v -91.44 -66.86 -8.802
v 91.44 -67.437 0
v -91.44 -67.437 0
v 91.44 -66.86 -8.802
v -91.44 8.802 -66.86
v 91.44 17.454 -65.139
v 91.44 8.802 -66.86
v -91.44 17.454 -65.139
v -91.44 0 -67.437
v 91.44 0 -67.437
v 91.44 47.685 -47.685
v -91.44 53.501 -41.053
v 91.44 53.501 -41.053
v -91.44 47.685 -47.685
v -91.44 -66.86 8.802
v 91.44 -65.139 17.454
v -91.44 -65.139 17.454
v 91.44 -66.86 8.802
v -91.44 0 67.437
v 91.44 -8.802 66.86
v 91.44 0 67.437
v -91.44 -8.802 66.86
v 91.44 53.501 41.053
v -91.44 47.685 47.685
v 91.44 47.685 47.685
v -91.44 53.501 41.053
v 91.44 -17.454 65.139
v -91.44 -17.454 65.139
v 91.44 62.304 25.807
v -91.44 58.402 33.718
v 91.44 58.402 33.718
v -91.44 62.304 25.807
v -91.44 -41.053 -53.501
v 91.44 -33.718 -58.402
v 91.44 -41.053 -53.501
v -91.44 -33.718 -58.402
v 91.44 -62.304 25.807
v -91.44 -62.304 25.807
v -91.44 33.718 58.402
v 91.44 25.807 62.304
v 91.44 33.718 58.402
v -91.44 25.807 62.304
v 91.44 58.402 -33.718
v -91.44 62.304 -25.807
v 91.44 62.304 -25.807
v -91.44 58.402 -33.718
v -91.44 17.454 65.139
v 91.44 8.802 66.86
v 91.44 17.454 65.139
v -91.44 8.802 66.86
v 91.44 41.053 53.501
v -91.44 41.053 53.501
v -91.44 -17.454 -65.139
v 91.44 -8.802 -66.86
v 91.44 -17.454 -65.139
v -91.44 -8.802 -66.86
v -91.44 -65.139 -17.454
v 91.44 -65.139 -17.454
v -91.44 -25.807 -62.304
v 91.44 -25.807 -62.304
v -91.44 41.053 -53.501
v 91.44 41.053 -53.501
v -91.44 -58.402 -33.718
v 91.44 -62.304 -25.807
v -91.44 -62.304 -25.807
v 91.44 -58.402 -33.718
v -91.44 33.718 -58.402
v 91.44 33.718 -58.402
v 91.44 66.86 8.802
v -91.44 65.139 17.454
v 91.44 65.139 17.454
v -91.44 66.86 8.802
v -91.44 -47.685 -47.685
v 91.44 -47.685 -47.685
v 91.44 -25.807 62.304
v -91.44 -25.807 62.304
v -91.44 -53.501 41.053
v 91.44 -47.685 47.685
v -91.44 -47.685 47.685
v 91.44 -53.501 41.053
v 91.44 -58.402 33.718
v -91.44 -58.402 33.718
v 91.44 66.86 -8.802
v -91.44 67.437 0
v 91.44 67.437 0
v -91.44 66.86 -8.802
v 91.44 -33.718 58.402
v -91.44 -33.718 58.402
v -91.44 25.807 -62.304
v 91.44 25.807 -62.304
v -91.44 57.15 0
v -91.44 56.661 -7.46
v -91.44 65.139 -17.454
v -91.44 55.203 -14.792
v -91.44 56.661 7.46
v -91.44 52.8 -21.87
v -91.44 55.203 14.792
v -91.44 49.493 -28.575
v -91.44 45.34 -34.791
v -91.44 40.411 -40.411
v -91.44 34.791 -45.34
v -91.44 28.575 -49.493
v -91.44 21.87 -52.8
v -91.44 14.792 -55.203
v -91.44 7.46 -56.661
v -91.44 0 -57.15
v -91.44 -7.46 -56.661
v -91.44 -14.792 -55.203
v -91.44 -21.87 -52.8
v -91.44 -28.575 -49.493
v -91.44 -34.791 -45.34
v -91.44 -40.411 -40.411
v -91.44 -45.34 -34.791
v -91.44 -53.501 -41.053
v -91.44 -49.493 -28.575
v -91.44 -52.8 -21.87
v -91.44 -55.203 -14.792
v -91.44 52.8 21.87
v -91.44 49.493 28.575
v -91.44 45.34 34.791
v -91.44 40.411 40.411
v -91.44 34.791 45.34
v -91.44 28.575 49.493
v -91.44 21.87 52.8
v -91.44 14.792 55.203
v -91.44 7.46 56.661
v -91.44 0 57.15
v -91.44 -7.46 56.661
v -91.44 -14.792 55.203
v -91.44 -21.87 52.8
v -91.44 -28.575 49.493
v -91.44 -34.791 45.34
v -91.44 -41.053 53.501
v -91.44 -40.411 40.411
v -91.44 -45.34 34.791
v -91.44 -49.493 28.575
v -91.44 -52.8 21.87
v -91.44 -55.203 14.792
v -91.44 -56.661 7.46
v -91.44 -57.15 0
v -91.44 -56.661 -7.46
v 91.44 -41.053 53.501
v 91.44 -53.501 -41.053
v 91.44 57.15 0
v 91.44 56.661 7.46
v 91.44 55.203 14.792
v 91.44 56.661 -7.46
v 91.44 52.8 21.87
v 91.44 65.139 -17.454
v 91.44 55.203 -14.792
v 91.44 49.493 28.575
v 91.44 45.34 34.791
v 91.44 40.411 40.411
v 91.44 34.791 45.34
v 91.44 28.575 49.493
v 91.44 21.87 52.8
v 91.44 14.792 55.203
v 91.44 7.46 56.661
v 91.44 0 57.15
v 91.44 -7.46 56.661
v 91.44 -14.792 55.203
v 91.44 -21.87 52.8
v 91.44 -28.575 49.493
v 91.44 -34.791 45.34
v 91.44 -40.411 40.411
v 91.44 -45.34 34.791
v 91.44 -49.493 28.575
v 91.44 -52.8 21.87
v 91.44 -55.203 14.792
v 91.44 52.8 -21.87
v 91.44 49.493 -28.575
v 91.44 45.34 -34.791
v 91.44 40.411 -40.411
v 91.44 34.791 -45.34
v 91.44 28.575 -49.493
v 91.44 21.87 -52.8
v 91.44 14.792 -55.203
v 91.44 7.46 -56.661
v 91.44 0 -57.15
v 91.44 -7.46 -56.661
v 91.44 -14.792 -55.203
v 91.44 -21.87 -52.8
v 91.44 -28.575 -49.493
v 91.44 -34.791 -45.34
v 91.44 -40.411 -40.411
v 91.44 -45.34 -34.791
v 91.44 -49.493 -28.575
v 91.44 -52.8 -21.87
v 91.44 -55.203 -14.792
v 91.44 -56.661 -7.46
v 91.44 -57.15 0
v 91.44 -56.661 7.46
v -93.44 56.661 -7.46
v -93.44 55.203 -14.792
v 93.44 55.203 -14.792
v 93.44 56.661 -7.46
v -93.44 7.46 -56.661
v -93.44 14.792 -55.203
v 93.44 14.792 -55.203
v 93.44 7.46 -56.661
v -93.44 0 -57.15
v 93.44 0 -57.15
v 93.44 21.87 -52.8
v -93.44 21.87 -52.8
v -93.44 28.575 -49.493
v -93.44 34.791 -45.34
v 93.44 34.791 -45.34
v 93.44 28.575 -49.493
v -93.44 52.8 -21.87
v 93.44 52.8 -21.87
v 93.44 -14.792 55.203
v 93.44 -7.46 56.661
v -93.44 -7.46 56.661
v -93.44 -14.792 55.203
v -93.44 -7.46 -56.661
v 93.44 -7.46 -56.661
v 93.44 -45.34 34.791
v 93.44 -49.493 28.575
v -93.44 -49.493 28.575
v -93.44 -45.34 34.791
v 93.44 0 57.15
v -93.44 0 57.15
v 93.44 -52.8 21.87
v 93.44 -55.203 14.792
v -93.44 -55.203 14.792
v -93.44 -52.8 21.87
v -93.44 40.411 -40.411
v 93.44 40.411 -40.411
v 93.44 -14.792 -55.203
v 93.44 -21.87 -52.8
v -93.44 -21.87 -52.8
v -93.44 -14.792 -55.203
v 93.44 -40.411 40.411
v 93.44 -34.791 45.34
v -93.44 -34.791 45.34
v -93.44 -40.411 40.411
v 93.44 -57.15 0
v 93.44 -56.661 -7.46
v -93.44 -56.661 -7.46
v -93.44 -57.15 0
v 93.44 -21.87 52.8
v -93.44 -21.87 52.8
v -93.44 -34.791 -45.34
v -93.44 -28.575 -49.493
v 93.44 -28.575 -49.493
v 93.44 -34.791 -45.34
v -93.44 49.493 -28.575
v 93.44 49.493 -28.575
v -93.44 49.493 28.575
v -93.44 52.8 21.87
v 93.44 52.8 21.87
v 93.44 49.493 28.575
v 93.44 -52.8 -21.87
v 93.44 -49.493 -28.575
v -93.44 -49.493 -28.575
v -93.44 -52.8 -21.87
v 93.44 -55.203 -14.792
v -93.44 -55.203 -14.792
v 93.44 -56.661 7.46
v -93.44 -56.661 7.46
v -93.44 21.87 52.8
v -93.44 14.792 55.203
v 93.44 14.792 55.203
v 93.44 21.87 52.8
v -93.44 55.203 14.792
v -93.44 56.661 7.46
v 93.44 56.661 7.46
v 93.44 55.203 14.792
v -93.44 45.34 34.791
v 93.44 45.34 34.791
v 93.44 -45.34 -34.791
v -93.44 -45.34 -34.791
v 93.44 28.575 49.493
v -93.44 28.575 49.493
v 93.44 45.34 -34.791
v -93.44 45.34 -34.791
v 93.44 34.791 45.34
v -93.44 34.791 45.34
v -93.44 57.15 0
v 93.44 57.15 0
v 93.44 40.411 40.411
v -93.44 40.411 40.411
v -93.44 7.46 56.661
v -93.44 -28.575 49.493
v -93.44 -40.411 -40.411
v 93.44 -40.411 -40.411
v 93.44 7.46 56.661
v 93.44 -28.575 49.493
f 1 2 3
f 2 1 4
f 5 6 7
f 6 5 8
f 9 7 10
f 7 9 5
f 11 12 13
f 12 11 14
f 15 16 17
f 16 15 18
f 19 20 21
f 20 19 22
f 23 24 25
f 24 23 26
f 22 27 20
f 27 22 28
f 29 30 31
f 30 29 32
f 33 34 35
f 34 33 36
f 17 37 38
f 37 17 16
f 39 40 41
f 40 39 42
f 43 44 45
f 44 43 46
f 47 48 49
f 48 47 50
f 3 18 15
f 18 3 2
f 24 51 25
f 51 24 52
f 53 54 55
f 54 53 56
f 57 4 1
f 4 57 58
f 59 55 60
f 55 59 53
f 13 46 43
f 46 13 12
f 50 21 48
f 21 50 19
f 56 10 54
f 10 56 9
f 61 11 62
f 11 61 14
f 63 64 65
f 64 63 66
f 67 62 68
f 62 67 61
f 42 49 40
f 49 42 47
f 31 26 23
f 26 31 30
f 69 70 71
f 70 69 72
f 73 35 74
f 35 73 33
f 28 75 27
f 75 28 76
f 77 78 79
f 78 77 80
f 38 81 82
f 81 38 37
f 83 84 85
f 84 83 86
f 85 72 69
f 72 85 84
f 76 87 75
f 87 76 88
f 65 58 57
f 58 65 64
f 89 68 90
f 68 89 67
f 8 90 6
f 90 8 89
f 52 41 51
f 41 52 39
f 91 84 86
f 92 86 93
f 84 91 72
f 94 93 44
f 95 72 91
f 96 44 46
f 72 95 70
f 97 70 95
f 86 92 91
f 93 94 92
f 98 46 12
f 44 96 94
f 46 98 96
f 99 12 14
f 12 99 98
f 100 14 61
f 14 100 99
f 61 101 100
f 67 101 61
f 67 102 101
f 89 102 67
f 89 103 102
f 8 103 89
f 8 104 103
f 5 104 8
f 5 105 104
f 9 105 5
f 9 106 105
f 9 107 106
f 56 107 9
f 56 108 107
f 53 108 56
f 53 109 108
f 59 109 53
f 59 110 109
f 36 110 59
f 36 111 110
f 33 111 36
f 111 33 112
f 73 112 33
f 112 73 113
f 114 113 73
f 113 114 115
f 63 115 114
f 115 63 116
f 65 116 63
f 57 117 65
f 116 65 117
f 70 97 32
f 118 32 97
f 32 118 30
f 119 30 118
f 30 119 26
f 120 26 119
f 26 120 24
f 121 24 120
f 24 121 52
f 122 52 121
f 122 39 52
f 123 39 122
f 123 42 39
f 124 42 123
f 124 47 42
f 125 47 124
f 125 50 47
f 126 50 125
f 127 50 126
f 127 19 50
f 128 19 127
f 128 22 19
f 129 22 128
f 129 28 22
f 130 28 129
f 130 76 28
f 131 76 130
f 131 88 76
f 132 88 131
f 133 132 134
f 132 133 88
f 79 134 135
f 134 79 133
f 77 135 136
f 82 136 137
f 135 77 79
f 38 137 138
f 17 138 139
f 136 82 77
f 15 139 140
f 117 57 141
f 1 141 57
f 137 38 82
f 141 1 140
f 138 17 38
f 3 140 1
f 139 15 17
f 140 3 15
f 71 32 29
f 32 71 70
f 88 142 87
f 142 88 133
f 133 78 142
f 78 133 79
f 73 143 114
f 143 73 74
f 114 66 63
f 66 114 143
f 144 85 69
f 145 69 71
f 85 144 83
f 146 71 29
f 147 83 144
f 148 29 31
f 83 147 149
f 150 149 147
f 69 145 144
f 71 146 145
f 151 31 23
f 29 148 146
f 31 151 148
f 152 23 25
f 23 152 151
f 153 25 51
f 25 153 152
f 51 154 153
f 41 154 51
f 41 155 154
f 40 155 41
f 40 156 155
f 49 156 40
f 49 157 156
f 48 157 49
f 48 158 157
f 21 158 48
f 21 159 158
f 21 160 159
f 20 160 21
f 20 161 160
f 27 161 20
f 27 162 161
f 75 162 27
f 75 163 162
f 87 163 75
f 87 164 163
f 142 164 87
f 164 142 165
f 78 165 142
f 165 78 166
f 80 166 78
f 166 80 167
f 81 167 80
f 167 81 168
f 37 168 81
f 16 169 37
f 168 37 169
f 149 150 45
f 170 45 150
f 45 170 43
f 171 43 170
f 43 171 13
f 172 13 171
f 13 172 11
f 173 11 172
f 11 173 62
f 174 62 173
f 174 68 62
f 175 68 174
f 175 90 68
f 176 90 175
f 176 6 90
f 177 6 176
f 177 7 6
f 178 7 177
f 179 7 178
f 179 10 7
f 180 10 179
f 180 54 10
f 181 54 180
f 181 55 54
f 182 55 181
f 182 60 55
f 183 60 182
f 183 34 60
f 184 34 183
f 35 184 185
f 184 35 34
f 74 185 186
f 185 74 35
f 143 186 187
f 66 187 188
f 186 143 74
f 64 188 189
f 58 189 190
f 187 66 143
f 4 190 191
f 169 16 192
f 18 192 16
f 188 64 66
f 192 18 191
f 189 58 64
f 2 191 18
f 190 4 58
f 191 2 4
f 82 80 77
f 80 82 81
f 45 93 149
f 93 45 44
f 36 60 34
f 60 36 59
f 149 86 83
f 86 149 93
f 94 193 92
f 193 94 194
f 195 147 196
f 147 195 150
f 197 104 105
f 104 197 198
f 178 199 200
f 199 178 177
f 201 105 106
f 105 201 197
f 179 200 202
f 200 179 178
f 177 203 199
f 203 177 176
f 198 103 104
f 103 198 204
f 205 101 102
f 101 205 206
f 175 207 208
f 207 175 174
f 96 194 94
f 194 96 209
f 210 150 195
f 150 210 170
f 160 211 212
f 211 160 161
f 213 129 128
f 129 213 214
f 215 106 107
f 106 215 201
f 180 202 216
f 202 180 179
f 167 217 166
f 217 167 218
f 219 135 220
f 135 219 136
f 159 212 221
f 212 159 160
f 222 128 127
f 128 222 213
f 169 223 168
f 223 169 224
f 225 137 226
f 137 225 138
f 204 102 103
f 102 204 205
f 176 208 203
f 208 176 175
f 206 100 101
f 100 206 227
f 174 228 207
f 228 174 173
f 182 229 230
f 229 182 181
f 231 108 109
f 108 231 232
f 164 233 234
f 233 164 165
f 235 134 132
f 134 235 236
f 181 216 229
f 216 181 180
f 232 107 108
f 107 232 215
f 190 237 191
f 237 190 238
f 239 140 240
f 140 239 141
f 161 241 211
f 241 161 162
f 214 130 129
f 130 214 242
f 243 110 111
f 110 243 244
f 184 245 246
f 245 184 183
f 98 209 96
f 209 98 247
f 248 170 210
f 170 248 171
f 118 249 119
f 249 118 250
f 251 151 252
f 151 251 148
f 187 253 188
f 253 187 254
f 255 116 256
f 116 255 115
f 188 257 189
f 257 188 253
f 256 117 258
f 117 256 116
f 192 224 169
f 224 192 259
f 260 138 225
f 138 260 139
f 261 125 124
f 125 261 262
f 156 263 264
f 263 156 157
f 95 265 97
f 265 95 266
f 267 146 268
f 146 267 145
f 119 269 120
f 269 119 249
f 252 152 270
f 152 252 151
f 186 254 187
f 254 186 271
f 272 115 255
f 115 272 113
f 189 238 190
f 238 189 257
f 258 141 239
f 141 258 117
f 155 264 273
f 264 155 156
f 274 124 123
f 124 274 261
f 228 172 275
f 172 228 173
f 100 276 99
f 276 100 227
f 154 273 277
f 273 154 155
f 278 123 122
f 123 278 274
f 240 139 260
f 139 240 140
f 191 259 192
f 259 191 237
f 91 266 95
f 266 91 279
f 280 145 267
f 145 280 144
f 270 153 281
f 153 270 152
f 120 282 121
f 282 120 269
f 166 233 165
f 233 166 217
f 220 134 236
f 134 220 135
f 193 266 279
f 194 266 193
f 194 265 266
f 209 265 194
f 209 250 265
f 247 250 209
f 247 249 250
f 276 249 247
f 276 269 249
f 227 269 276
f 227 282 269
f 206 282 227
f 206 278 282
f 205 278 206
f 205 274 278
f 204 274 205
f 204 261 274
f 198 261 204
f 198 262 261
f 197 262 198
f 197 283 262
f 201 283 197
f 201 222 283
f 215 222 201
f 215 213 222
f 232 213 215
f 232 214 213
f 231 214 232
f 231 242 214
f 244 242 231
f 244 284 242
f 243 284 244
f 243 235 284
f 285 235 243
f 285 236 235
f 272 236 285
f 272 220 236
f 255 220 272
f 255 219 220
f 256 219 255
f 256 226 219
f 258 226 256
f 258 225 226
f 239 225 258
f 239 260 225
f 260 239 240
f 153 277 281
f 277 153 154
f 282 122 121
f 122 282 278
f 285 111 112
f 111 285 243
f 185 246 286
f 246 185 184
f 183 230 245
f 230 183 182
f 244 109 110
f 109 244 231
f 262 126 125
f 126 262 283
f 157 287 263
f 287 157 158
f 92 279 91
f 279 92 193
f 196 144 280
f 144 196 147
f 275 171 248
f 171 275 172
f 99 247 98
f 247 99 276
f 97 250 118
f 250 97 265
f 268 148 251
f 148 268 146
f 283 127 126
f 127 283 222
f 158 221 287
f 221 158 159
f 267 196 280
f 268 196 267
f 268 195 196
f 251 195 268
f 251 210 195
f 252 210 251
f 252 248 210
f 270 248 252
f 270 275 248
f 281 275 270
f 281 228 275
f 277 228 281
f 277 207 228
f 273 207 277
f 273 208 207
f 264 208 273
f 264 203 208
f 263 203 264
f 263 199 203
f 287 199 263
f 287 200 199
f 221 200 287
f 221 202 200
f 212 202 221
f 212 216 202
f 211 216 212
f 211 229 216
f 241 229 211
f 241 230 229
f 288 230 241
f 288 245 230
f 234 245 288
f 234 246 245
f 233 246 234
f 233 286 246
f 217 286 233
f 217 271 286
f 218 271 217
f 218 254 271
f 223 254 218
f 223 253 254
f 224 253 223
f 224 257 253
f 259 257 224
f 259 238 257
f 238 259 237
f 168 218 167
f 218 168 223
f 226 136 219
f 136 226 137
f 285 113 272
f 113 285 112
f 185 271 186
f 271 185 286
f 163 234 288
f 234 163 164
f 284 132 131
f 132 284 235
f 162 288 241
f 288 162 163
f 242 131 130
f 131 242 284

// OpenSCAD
// Auto-generated by scripts/author_from_manifest.py (Phase D.3).
// Source: data/phase_d_manifest.json (sku_intent='victaulic-107v-quickvic-coupling-4in').
// Do not hand-edit — regenerate from the manifest.
//
// @part victaulic_107v_quickvic_coupling_4in
// @kind fitting
// @category fitting.coupling
// @display-name "Victaulic QuickVic Style 107V Installation-Ready Coupling 4\""
// @mfg victaulic
// @mfg-pn Style_107V_4in
// @listing UL FM
// @price-usd 62.00
// @install-minutes 6
// @crew journeyman
// @param size_in number default=4 label="Size" unit="in"
// @port inlet position=[-0.05,0,0] direction=[-1,0,0] style=grooved size_in=4 role=run_a
// @port outlet position=[0.05,0,0] direction=[1,0,0] style=grooved size_in=4 role=run_b

size_in = 4.0;

function od_mm(nps) =
    nps ==   1  ? 33.4 :
    nps == 1.25 ? 42.2 :
    nps == 1.5  ? 48.3 :
    nps ==   2  ? 60.3 :
    nps == 2.5  ? 73.0 :
    nps ==   3  ? 88.9 :
    nps ==   4  ? 114.3 :
    nps ==   5  ? 141.3 :
    nps ==   6  ? 168.3 :
    nps ==   8  ? 219.1 :
    nps ==  10  ? 273.0 : 60.3;

od = od_mm(size_in);
len_mm = od * 1.6;

rotate([0, 90, 0])
    union() {
        cylinder(h = len_mm, d = od * 1.18, center = true, $fn = 48);
        cylinder(h = len_mm + 4, d = od, center = true, $fn = 48);
    }
